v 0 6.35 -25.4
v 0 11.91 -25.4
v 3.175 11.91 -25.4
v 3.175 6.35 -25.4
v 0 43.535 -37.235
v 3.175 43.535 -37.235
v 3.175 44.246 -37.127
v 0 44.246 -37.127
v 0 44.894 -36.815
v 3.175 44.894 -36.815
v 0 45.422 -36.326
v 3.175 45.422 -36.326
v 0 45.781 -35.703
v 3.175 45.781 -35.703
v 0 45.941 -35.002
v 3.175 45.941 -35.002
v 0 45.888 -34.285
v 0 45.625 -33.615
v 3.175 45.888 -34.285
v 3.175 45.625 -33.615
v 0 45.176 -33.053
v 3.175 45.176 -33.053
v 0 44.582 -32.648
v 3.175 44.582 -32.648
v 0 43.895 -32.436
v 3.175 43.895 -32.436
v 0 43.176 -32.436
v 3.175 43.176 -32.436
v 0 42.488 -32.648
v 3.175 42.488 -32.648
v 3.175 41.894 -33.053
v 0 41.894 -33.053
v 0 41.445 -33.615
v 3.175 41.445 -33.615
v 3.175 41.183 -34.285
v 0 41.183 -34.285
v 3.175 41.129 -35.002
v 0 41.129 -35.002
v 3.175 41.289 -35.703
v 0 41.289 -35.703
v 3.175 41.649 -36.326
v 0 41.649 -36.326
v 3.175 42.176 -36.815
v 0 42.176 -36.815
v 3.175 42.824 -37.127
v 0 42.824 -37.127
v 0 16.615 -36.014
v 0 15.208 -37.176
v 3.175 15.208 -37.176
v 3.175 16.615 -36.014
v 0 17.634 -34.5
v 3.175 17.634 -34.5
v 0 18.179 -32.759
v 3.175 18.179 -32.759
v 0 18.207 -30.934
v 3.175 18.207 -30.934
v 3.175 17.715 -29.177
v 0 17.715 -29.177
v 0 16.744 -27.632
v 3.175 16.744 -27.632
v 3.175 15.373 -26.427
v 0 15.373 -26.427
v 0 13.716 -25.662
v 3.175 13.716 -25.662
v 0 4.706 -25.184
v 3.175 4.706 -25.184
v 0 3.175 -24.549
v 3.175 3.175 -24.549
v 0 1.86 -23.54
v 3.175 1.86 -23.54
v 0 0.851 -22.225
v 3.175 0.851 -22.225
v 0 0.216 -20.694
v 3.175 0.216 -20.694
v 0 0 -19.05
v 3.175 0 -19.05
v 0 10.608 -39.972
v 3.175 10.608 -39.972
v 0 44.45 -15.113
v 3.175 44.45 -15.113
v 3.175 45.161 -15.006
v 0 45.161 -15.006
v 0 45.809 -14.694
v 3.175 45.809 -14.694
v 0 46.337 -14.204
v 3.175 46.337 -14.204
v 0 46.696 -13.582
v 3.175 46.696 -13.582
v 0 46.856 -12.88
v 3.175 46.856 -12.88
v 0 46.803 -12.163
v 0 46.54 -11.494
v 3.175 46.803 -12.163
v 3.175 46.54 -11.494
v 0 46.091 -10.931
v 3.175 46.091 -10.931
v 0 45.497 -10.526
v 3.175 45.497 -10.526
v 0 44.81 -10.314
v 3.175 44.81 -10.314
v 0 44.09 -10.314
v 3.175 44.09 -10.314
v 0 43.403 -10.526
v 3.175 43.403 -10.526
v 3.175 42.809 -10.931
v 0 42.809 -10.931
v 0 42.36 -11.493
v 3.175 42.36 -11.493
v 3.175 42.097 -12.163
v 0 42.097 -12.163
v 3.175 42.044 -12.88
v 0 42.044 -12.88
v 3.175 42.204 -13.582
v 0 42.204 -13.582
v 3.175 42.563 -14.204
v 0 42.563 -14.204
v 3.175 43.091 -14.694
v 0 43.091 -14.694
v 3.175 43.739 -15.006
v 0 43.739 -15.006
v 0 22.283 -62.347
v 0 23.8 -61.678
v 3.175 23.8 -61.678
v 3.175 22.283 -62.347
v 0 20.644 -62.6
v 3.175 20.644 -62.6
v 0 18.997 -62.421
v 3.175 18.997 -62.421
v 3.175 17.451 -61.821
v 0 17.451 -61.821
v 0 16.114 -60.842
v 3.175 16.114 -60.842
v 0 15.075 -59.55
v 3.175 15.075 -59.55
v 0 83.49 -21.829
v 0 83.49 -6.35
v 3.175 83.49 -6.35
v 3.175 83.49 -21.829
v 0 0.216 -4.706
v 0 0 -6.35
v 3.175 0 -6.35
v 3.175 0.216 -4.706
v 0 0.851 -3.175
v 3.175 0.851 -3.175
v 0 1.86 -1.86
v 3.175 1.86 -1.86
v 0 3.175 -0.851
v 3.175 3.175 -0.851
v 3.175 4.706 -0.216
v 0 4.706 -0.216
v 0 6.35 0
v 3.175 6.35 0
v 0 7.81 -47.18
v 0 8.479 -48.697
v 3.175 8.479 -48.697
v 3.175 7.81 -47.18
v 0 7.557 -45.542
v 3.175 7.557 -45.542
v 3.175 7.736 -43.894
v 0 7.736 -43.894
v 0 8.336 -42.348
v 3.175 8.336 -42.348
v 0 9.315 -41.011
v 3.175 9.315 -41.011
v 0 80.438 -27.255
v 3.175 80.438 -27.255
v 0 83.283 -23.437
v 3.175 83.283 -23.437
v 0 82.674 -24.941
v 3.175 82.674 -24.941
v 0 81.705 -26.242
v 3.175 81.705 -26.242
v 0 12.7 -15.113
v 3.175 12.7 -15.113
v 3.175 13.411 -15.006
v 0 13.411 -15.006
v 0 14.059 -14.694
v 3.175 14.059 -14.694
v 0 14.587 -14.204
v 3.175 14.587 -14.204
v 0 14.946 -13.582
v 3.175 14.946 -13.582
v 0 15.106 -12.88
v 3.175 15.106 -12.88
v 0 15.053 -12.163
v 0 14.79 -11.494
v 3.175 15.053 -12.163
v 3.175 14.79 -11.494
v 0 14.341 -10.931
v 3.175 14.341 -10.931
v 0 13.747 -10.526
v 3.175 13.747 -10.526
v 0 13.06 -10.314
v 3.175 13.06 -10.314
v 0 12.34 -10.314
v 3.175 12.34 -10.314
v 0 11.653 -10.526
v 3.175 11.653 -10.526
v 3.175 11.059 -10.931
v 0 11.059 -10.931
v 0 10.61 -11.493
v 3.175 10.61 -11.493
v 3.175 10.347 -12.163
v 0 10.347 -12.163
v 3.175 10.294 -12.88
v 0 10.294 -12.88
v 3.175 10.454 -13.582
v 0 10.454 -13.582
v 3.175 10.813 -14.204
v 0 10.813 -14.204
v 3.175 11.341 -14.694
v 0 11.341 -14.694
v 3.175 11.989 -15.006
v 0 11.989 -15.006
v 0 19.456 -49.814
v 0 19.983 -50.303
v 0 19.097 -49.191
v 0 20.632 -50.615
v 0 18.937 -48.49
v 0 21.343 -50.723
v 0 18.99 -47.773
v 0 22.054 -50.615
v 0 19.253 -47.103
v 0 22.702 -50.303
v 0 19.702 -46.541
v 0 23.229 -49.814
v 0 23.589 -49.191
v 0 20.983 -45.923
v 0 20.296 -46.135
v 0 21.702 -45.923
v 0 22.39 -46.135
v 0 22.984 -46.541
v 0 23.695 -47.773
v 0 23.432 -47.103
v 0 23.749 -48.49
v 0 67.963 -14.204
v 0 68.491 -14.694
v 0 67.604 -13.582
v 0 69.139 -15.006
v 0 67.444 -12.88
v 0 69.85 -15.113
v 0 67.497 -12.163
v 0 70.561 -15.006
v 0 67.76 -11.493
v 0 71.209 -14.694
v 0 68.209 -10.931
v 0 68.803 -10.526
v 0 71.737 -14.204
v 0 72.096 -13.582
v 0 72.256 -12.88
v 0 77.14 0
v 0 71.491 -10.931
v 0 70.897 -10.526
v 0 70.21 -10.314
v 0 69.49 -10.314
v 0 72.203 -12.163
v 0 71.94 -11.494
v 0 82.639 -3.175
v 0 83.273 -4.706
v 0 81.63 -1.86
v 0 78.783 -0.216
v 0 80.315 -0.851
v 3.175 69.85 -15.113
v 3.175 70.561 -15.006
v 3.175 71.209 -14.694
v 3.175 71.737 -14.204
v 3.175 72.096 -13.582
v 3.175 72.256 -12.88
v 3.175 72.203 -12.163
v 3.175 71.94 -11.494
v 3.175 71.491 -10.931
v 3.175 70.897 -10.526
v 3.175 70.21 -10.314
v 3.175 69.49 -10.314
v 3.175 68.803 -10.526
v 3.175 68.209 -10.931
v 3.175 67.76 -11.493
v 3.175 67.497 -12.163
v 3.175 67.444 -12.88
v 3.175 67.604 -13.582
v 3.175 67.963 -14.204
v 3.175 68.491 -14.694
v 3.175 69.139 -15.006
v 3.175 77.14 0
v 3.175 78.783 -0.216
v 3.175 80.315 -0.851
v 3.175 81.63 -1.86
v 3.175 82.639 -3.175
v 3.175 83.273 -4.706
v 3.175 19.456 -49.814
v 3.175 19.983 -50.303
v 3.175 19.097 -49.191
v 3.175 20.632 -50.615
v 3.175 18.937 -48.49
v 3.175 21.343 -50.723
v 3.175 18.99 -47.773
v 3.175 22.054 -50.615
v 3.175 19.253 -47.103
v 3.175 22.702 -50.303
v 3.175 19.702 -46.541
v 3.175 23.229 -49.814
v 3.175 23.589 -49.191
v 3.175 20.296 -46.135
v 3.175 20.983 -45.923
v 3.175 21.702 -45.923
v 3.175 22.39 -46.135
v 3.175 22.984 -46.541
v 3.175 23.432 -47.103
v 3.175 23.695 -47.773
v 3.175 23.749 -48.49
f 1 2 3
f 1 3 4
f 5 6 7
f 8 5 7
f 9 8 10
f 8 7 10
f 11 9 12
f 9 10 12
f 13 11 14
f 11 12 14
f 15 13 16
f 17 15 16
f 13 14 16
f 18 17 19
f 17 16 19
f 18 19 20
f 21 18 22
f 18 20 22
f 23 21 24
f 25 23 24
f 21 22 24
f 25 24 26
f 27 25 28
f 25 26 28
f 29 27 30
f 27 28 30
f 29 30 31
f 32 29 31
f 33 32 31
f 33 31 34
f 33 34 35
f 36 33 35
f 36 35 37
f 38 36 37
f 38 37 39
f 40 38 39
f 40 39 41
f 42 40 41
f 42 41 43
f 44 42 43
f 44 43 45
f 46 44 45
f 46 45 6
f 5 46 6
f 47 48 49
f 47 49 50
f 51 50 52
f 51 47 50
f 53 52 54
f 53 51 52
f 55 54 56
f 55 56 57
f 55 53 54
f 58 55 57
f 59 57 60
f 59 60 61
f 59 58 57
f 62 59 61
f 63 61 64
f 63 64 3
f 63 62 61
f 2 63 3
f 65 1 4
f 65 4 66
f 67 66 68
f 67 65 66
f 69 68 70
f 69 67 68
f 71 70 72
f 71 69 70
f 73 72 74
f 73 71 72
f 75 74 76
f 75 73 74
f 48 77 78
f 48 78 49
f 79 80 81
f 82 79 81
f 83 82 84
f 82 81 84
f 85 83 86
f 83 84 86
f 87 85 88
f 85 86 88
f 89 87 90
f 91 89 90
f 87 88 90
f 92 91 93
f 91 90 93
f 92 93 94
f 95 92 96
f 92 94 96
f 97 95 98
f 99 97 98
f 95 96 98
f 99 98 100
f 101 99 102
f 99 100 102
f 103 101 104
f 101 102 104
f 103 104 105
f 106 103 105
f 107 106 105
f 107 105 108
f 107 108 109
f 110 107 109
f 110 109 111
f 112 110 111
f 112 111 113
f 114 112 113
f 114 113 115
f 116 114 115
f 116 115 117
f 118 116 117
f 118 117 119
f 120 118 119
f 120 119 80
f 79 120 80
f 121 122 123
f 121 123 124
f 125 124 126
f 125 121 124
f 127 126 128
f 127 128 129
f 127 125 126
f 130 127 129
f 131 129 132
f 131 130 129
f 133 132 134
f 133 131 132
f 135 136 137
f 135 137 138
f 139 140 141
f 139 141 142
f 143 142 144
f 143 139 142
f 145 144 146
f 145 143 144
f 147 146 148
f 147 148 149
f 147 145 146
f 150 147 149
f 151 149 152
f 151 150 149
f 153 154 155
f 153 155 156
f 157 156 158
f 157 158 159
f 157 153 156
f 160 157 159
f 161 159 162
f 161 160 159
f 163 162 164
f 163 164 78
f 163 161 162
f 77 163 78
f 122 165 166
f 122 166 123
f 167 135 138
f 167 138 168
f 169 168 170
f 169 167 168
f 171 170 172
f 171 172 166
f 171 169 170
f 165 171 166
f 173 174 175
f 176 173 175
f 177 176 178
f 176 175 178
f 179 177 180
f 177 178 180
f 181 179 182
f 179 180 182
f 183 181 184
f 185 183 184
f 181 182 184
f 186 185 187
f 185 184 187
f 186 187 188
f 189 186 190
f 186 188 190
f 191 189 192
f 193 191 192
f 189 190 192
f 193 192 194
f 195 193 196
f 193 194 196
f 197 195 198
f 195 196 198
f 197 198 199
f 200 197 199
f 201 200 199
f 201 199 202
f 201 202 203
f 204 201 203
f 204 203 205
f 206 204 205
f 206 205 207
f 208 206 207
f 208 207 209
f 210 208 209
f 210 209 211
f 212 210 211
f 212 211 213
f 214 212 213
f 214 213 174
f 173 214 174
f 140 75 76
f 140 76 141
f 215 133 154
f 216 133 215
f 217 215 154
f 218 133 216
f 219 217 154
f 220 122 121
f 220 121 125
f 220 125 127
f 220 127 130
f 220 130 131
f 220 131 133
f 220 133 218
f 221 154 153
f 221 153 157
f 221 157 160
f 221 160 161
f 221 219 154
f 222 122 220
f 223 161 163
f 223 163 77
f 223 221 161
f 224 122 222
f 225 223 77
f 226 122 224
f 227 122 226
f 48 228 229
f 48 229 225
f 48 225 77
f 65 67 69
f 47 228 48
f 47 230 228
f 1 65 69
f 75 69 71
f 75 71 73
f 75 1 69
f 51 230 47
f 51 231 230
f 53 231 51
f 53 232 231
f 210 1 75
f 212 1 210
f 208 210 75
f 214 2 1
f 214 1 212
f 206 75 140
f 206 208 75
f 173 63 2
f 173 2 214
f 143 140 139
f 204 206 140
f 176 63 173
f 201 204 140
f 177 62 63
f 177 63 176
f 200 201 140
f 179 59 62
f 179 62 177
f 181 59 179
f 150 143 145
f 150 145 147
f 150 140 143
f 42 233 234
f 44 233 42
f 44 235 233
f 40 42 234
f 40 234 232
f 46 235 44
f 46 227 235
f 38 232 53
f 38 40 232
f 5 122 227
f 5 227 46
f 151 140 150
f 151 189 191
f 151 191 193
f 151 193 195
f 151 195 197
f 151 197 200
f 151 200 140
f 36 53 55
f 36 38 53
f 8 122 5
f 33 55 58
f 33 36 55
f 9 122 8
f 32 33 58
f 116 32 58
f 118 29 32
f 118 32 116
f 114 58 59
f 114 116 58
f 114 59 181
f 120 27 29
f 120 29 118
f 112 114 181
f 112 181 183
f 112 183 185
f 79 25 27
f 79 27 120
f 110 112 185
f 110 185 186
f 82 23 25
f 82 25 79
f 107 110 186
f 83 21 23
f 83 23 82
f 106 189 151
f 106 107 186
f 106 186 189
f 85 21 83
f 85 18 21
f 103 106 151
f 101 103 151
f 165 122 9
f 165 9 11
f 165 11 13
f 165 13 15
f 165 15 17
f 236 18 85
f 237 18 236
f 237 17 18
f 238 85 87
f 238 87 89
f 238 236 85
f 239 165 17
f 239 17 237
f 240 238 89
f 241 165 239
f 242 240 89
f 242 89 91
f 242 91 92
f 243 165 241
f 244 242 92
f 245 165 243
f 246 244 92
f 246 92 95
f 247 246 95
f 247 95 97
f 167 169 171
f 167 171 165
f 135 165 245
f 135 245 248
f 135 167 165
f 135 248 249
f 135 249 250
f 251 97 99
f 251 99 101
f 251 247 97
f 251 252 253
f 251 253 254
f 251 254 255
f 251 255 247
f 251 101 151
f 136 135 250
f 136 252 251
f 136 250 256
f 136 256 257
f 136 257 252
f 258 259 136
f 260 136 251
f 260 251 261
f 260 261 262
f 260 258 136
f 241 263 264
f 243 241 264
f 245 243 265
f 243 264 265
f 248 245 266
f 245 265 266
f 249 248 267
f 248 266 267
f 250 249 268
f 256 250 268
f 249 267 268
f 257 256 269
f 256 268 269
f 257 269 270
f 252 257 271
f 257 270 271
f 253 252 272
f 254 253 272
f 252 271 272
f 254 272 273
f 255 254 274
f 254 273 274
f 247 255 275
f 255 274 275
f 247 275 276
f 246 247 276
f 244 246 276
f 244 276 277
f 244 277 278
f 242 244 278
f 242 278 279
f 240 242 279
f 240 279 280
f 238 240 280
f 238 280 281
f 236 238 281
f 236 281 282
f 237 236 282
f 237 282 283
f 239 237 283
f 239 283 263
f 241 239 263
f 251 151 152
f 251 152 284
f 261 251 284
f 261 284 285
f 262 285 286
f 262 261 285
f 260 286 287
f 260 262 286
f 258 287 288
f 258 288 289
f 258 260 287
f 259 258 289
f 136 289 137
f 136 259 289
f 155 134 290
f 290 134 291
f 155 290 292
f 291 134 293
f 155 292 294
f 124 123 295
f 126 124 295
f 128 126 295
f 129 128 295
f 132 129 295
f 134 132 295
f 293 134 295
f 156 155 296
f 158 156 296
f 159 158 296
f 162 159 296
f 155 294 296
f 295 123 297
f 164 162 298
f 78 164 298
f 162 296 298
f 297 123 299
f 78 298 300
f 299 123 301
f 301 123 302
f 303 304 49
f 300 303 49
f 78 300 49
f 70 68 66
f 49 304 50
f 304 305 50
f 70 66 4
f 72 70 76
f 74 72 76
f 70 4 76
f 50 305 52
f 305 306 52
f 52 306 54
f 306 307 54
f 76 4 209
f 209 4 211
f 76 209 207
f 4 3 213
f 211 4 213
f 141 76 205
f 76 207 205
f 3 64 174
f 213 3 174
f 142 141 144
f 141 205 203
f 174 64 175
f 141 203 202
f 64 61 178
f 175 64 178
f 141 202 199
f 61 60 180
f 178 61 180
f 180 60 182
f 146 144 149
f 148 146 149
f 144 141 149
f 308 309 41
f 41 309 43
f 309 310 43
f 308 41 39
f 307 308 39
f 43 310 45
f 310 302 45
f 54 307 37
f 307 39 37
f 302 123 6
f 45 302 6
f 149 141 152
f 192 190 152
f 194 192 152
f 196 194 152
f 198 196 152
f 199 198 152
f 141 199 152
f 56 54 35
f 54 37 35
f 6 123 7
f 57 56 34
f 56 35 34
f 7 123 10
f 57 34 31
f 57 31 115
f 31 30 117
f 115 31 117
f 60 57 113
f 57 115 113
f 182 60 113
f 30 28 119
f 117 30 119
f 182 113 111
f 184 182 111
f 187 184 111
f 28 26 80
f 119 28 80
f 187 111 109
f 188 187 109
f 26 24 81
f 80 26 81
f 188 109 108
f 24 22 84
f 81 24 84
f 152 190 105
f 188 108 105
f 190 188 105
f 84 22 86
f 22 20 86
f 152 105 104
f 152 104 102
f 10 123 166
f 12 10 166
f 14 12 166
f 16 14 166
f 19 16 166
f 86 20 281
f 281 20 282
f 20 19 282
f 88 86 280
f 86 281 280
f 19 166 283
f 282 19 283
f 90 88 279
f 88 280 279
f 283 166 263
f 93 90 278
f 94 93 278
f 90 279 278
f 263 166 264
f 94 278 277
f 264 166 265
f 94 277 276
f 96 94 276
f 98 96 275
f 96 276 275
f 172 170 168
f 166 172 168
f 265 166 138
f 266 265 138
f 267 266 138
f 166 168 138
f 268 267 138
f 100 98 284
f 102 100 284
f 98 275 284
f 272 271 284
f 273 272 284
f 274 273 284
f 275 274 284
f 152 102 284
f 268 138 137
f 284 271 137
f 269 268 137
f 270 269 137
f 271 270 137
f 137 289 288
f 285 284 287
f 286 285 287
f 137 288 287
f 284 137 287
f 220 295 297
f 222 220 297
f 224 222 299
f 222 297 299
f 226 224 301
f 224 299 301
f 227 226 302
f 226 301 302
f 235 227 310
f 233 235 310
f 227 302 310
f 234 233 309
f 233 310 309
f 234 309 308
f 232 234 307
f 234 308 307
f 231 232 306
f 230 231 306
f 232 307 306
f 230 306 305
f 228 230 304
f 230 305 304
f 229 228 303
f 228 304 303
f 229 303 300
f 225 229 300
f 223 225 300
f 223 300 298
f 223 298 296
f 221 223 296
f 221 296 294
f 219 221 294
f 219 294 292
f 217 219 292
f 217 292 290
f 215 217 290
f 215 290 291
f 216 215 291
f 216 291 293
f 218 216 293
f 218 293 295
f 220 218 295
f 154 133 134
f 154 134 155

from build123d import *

# Parameters (mm, degrees)
BOSS_EXTRUDE1_DEPTH = 3.175
SKETCH2_R           = 2.413
CUT_EXTRUDE1_DEPTH  = 105.401092279


with BuildPart() as part:
    # Sketch1 → Boss-Extrude1 (new body)
    with BuildSketch(Plane(origin=(0, 0, 0), x_dir=(0, 0, -1), z_dir=(1, 0, 0))):
        with BuildLine():
            Line((27.254915981, 80.437799327), (61.677992598, 23.799518102))
            ThreePointArc((61.677992598, 23.799518102), (62.420677668, 18.996519818), (59.549602661, 15.075129511))
            Line((59.549602661, 15.075129511), (48.696824135, 8.479130857))
            ThreePointArc((48.696824135, 8.479130857), (43.89382585, 7.736445787), (39.972435544, 10.607520794))
            Line((39.972435544, 10.607520794), (37.176389263, 15.208017644))
            ThreePointArc((37.176389263, 15.208017644), (30.037556106, 18.024757552), (25.4, 11.910018317))
            Line((25.4, 11.910018317), (25.4, 6.35))
            ThreePointArc((25.4, 6.35), (23.540128061, 1.859871939), (19.05, 0))
            Line((19.05, 0), (6.35, 0))
            ThreePointArc((6.35, 0), (1.859871939, 1.859871939), (0, 6.35))
            Line((0, 6.35), (0, 77.1398))
            ThreePointArc((0, 77.1398), (1.859871939, 81.629928061), (6.35, 83.4898))
            Line((6.35, 83.4898), (21.828526718, 83.4898))
            ThreePointArc((21.828526718, 83.4898), (24.941419607, 82.674454268), (27.254915981, 80.437799327))
        make_face()
    extrude(amount=BOSS_EXTRUDE1_DEPTH)

    # Sketch2 → Cut-Extrude1 (cut, through all)
    with BuildSketch(Plane(origin=(3.175, 0, 0), x_dir=(0, 0, -1), z_dir=(1, 0, 0))):
        with Locations((12.7, 12.7)):
            Circle(SKETCH2_R)
        with Locations((12.7, 44.45)):
            Circle(SKETCH2_R)
        with Locations((12.7, 69.85)):
            Circle(SKETCH2_R)
        with Locations((34.821609996, 43.535175921)):
            Circle(SKETCH2_R)
        with Locations((48.30950313, 21.342764331)):
            Circle(SKETCH2_R)
    extrude(amount=-CUT_EXTRUDE1_DEPTH, mode=Mode.SUBTRACT)


solid = part.part
